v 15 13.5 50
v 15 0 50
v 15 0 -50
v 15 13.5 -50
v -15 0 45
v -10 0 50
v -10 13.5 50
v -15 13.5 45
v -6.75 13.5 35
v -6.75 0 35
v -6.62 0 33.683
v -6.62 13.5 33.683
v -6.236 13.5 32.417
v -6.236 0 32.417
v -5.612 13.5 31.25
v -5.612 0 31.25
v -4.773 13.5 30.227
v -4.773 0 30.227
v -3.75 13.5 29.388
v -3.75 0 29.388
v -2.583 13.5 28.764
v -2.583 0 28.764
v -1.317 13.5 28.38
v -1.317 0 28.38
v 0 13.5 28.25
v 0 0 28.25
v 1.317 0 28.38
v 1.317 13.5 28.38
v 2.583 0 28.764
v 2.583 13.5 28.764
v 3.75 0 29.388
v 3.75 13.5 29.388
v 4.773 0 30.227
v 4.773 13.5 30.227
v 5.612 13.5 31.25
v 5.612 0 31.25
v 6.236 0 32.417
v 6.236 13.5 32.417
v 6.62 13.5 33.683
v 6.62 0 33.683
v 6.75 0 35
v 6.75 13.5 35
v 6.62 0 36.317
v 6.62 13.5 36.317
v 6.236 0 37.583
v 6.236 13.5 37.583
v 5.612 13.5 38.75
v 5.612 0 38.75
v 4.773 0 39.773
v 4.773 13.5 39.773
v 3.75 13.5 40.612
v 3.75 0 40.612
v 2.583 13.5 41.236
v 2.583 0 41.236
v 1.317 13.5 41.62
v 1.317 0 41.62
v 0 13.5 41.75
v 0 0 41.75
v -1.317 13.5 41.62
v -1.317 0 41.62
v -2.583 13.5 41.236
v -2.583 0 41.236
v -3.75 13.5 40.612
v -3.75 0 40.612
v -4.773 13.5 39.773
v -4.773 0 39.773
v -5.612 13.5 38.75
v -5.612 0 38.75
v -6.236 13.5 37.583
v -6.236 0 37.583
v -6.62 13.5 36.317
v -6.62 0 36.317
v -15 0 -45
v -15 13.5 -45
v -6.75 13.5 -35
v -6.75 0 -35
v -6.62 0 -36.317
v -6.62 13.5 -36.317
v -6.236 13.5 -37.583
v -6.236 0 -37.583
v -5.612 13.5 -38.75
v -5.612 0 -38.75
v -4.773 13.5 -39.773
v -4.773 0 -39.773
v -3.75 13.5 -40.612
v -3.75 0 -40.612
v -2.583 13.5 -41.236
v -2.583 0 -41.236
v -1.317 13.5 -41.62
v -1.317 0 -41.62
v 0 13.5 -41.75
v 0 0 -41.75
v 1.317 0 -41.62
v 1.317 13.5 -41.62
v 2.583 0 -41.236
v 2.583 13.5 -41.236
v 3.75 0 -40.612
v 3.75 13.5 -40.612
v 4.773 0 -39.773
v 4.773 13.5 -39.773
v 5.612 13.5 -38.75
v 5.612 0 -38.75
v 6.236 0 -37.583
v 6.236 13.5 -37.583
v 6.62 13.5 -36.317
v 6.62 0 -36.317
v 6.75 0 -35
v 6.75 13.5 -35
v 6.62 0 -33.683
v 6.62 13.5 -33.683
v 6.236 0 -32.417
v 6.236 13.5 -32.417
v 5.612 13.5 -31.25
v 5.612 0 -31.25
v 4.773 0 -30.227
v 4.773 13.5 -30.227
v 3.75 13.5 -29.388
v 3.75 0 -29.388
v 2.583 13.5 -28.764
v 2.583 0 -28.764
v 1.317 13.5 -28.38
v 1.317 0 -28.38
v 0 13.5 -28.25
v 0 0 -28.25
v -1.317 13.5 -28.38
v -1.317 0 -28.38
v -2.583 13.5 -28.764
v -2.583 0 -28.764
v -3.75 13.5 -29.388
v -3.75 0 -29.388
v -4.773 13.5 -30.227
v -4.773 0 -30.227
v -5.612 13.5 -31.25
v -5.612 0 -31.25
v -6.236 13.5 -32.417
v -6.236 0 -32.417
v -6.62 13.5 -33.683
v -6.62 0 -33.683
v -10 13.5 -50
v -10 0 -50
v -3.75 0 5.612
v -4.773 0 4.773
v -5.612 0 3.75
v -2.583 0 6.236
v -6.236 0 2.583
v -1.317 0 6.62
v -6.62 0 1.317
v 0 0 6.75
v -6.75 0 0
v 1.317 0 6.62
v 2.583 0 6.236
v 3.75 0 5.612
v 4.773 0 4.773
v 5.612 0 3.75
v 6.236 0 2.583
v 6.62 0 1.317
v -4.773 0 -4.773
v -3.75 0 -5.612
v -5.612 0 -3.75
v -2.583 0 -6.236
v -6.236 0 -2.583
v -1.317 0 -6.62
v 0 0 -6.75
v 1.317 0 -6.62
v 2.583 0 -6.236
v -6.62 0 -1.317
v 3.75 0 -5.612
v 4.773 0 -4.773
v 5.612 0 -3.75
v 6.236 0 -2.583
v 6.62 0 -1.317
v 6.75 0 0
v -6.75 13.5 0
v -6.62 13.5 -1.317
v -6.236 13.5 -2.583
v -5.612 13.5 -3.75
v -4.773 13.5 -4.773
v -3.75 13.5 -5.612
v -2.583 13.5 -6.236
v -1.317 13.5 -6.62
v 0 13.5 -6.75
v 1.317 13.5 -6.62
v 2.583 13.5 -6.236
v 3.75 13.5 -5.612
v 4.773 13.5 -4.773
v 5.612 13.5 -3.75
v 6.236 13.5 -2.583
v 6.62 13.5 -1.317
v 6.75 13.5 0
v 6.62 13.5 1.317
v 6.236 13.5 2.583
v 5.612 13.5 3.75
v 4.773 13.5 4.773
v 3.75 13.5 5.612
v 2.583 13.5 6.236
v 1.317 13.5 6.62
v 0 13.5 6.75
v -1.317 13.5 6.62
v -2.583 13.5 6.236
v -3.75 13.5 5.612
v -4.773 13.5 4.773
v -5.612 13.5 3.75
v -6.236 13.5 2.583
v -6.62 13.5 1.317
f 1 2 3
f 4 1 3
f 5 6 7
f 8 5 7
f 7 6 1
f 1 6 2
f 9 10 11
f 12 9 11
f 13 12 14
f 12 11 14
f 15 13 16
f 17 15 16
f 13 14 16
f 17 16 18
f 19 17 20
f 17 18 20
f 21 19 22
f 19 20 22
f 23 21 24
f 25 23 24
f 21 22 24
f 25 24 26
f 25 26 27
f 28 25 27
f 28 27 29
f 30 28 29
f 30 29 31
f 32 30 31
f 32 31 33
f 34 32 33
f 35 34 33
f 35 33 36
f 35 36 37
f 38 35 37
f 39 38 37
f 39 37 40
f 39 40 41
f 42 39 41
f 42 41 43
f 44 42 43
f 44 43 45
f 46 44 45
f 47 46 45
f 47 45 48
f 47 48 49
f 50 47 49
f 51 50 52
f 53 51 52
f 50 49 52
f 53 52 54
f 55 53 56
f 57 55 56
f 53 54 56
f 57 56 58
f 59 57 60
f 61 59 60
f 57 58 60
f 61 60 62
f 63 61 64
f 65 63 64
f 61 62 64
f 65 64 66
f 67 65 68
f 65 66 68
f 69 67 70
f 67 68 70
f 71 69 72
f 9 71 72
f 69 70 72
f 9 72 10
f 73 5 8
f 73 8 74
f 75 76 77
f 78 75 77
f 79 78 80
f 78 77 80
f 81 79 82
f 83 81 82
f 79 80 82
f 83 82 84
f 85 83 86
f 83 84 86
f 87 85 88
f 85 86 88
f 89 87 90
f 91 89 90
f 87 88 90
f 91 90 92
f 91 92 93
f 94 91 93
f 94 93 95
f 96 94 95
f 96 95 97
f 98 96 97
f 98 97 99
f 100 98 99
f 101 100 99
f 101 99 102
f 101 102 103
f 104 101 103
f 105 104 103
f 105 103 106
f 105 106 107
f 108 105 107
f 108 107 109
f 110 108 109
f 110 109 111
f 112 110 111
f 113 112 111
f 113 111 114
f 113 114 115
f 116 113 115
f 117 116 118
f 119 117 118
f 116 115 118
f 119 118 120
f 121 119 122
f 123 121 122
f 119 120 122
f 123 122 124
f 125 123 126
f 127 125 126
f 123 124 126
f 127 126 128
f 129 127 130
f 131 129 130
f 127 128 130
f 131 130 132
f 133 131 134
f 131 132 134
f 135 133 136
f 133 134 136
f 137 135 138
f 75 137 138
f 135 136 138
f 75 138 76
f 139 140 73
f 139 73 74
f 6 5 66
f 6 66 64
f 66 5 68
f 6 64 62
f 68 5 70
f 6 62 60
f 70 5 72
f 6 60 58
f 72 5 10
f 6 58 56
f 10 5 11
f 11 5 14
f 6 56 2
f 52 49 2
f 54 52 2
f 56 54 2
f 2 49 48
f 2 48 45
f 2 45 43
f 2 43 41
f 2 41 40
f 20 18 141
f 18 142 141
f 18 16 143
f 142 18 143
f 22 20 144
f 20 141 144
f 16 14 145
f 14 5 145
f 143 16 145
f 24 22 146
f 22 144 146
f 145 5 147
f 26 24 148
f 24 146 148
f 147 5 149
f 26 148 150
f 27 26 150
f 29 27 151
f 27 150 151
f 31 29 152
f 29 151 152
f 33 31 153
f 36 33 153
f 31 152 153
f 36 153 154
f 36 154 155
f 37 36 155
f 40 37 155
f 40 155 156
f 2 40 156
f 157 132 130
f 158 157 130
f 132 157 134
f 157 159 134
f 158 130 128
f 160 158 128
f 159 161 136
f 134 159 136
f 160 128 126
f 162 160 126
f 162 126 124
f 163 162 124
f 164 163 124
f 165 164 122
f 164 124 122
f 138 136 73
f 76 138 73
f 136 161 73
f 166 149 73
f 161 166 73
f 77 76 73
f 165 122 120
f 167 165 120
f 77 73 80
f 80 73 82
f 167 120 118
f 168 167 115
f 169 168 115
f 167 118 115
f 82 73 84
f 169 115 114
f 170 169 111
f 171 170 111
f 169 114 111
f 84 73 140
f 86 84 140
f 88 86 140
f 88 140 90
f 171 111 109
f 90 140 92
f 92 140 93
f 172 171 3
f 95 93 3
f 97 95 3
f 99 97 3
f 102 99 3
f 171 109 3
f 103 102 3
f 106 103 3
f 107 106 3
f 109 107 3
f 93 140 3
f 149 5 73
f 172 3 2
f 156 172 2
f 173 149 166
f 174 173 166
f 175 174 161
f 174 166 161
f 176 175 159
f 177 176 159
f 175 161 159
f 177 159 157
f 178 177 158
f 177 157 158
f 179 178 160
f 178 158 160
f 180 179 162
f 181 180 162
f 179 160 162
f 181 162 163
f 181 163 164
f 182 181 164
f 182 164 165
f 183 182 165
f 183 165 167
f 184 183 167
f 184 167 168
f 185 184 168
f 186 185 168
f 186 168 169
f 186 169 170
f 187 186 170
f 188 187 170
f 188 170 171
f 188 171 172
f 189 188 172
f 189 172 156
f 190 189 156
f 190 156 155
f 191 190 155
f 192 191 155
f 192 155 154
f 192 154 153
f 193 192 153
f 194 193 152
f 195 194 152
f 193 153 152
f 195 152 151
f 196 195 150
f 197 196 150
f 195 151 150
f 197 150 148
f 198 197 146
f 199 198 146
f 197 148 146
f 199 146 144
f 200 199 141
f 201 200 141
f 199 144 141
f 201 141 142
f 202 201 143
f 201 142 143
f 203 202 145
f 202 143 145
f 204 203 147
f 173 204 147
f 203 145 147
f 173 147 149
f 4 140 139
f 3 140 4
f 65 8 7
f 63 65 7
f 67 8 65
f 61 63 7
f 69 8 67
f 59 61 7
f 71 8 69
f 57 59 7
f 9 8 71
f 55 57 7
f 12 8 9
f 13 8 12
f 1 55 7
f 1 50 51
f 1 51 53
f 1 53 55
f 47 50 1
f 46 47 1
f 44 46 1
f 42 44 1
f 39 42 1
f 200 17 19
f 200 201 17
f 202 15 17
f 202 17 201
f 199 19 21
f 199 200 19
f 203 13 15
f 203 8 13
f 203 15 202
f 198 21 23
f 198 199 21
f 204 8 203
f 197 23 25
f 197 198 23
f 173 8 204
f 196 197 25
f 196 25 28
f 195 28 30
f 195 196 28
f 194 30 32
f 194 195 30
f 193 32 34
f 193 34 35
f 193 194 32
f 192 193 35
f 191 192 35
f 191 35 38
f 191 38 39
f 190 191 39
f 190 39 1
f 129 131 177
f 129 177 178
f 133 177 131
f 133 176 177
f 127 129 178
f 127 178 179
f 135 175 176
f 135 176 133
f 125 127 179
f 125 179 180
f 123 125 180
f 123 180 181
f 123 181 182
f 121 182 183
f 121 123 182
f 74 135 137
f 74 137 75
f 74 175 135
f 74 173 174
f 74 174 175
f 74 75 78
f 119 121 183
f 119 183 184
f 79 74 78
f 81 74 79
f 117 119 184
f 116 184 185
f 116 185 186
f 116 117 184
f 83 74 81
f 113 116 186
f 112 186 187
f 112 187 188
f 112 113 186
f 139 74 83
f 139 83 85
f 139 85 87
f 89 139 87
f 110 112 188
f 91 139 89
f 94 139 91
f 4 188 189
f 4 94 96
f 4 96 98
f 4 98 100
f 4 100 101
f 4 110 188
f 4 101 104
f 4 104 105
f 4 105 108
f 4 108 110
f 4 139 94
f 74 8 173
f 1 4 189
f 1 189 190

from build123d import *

# Parameters (mm, degrees)
SKETCH1_W             = 30
SKETCH1_H             = 100
BOSS_EXTRUDE1_DEPTH   = 13.5
M12_CLEARANCE_HOLE1_D = 13.5
CHAMFER1_SIZE         = 5


with BuildPart() as part:
    # Sketch1 → Boss-Extrude1 (new body)
    with BuildSketch(Plane(origin=(0, 0, 0), x_dir=(1, 0, 0), z_dir=(0, 1, 0))):
        Rectangle(SKETCH1_W, SKETCH1_H)
    extrude(amount=BOSS_EXTRUDE1_DEPTH)

    # M12 Clearance Hole1 (through all)
    with Locations(Plane(origin=(0, 13.5, 0), x_dir=(1, 0, 0), z_dir=(0, 1, 0))):
        with Locations((0, 35), (0, -35), (0, 0)):
            Hole(M12_CLEARANCE_HOLE1_D / 2)

    # Chamfer1
    chamfer1_edges = [part.edges().sort_by_distance(p)[0] for p in [
        (-15, 6.75, -50),
        (-15, 6.75, 50),
    ]]
    chamfer(chamfer1_edges, length=CHAMFER1_SIZE)


solid = part.part
